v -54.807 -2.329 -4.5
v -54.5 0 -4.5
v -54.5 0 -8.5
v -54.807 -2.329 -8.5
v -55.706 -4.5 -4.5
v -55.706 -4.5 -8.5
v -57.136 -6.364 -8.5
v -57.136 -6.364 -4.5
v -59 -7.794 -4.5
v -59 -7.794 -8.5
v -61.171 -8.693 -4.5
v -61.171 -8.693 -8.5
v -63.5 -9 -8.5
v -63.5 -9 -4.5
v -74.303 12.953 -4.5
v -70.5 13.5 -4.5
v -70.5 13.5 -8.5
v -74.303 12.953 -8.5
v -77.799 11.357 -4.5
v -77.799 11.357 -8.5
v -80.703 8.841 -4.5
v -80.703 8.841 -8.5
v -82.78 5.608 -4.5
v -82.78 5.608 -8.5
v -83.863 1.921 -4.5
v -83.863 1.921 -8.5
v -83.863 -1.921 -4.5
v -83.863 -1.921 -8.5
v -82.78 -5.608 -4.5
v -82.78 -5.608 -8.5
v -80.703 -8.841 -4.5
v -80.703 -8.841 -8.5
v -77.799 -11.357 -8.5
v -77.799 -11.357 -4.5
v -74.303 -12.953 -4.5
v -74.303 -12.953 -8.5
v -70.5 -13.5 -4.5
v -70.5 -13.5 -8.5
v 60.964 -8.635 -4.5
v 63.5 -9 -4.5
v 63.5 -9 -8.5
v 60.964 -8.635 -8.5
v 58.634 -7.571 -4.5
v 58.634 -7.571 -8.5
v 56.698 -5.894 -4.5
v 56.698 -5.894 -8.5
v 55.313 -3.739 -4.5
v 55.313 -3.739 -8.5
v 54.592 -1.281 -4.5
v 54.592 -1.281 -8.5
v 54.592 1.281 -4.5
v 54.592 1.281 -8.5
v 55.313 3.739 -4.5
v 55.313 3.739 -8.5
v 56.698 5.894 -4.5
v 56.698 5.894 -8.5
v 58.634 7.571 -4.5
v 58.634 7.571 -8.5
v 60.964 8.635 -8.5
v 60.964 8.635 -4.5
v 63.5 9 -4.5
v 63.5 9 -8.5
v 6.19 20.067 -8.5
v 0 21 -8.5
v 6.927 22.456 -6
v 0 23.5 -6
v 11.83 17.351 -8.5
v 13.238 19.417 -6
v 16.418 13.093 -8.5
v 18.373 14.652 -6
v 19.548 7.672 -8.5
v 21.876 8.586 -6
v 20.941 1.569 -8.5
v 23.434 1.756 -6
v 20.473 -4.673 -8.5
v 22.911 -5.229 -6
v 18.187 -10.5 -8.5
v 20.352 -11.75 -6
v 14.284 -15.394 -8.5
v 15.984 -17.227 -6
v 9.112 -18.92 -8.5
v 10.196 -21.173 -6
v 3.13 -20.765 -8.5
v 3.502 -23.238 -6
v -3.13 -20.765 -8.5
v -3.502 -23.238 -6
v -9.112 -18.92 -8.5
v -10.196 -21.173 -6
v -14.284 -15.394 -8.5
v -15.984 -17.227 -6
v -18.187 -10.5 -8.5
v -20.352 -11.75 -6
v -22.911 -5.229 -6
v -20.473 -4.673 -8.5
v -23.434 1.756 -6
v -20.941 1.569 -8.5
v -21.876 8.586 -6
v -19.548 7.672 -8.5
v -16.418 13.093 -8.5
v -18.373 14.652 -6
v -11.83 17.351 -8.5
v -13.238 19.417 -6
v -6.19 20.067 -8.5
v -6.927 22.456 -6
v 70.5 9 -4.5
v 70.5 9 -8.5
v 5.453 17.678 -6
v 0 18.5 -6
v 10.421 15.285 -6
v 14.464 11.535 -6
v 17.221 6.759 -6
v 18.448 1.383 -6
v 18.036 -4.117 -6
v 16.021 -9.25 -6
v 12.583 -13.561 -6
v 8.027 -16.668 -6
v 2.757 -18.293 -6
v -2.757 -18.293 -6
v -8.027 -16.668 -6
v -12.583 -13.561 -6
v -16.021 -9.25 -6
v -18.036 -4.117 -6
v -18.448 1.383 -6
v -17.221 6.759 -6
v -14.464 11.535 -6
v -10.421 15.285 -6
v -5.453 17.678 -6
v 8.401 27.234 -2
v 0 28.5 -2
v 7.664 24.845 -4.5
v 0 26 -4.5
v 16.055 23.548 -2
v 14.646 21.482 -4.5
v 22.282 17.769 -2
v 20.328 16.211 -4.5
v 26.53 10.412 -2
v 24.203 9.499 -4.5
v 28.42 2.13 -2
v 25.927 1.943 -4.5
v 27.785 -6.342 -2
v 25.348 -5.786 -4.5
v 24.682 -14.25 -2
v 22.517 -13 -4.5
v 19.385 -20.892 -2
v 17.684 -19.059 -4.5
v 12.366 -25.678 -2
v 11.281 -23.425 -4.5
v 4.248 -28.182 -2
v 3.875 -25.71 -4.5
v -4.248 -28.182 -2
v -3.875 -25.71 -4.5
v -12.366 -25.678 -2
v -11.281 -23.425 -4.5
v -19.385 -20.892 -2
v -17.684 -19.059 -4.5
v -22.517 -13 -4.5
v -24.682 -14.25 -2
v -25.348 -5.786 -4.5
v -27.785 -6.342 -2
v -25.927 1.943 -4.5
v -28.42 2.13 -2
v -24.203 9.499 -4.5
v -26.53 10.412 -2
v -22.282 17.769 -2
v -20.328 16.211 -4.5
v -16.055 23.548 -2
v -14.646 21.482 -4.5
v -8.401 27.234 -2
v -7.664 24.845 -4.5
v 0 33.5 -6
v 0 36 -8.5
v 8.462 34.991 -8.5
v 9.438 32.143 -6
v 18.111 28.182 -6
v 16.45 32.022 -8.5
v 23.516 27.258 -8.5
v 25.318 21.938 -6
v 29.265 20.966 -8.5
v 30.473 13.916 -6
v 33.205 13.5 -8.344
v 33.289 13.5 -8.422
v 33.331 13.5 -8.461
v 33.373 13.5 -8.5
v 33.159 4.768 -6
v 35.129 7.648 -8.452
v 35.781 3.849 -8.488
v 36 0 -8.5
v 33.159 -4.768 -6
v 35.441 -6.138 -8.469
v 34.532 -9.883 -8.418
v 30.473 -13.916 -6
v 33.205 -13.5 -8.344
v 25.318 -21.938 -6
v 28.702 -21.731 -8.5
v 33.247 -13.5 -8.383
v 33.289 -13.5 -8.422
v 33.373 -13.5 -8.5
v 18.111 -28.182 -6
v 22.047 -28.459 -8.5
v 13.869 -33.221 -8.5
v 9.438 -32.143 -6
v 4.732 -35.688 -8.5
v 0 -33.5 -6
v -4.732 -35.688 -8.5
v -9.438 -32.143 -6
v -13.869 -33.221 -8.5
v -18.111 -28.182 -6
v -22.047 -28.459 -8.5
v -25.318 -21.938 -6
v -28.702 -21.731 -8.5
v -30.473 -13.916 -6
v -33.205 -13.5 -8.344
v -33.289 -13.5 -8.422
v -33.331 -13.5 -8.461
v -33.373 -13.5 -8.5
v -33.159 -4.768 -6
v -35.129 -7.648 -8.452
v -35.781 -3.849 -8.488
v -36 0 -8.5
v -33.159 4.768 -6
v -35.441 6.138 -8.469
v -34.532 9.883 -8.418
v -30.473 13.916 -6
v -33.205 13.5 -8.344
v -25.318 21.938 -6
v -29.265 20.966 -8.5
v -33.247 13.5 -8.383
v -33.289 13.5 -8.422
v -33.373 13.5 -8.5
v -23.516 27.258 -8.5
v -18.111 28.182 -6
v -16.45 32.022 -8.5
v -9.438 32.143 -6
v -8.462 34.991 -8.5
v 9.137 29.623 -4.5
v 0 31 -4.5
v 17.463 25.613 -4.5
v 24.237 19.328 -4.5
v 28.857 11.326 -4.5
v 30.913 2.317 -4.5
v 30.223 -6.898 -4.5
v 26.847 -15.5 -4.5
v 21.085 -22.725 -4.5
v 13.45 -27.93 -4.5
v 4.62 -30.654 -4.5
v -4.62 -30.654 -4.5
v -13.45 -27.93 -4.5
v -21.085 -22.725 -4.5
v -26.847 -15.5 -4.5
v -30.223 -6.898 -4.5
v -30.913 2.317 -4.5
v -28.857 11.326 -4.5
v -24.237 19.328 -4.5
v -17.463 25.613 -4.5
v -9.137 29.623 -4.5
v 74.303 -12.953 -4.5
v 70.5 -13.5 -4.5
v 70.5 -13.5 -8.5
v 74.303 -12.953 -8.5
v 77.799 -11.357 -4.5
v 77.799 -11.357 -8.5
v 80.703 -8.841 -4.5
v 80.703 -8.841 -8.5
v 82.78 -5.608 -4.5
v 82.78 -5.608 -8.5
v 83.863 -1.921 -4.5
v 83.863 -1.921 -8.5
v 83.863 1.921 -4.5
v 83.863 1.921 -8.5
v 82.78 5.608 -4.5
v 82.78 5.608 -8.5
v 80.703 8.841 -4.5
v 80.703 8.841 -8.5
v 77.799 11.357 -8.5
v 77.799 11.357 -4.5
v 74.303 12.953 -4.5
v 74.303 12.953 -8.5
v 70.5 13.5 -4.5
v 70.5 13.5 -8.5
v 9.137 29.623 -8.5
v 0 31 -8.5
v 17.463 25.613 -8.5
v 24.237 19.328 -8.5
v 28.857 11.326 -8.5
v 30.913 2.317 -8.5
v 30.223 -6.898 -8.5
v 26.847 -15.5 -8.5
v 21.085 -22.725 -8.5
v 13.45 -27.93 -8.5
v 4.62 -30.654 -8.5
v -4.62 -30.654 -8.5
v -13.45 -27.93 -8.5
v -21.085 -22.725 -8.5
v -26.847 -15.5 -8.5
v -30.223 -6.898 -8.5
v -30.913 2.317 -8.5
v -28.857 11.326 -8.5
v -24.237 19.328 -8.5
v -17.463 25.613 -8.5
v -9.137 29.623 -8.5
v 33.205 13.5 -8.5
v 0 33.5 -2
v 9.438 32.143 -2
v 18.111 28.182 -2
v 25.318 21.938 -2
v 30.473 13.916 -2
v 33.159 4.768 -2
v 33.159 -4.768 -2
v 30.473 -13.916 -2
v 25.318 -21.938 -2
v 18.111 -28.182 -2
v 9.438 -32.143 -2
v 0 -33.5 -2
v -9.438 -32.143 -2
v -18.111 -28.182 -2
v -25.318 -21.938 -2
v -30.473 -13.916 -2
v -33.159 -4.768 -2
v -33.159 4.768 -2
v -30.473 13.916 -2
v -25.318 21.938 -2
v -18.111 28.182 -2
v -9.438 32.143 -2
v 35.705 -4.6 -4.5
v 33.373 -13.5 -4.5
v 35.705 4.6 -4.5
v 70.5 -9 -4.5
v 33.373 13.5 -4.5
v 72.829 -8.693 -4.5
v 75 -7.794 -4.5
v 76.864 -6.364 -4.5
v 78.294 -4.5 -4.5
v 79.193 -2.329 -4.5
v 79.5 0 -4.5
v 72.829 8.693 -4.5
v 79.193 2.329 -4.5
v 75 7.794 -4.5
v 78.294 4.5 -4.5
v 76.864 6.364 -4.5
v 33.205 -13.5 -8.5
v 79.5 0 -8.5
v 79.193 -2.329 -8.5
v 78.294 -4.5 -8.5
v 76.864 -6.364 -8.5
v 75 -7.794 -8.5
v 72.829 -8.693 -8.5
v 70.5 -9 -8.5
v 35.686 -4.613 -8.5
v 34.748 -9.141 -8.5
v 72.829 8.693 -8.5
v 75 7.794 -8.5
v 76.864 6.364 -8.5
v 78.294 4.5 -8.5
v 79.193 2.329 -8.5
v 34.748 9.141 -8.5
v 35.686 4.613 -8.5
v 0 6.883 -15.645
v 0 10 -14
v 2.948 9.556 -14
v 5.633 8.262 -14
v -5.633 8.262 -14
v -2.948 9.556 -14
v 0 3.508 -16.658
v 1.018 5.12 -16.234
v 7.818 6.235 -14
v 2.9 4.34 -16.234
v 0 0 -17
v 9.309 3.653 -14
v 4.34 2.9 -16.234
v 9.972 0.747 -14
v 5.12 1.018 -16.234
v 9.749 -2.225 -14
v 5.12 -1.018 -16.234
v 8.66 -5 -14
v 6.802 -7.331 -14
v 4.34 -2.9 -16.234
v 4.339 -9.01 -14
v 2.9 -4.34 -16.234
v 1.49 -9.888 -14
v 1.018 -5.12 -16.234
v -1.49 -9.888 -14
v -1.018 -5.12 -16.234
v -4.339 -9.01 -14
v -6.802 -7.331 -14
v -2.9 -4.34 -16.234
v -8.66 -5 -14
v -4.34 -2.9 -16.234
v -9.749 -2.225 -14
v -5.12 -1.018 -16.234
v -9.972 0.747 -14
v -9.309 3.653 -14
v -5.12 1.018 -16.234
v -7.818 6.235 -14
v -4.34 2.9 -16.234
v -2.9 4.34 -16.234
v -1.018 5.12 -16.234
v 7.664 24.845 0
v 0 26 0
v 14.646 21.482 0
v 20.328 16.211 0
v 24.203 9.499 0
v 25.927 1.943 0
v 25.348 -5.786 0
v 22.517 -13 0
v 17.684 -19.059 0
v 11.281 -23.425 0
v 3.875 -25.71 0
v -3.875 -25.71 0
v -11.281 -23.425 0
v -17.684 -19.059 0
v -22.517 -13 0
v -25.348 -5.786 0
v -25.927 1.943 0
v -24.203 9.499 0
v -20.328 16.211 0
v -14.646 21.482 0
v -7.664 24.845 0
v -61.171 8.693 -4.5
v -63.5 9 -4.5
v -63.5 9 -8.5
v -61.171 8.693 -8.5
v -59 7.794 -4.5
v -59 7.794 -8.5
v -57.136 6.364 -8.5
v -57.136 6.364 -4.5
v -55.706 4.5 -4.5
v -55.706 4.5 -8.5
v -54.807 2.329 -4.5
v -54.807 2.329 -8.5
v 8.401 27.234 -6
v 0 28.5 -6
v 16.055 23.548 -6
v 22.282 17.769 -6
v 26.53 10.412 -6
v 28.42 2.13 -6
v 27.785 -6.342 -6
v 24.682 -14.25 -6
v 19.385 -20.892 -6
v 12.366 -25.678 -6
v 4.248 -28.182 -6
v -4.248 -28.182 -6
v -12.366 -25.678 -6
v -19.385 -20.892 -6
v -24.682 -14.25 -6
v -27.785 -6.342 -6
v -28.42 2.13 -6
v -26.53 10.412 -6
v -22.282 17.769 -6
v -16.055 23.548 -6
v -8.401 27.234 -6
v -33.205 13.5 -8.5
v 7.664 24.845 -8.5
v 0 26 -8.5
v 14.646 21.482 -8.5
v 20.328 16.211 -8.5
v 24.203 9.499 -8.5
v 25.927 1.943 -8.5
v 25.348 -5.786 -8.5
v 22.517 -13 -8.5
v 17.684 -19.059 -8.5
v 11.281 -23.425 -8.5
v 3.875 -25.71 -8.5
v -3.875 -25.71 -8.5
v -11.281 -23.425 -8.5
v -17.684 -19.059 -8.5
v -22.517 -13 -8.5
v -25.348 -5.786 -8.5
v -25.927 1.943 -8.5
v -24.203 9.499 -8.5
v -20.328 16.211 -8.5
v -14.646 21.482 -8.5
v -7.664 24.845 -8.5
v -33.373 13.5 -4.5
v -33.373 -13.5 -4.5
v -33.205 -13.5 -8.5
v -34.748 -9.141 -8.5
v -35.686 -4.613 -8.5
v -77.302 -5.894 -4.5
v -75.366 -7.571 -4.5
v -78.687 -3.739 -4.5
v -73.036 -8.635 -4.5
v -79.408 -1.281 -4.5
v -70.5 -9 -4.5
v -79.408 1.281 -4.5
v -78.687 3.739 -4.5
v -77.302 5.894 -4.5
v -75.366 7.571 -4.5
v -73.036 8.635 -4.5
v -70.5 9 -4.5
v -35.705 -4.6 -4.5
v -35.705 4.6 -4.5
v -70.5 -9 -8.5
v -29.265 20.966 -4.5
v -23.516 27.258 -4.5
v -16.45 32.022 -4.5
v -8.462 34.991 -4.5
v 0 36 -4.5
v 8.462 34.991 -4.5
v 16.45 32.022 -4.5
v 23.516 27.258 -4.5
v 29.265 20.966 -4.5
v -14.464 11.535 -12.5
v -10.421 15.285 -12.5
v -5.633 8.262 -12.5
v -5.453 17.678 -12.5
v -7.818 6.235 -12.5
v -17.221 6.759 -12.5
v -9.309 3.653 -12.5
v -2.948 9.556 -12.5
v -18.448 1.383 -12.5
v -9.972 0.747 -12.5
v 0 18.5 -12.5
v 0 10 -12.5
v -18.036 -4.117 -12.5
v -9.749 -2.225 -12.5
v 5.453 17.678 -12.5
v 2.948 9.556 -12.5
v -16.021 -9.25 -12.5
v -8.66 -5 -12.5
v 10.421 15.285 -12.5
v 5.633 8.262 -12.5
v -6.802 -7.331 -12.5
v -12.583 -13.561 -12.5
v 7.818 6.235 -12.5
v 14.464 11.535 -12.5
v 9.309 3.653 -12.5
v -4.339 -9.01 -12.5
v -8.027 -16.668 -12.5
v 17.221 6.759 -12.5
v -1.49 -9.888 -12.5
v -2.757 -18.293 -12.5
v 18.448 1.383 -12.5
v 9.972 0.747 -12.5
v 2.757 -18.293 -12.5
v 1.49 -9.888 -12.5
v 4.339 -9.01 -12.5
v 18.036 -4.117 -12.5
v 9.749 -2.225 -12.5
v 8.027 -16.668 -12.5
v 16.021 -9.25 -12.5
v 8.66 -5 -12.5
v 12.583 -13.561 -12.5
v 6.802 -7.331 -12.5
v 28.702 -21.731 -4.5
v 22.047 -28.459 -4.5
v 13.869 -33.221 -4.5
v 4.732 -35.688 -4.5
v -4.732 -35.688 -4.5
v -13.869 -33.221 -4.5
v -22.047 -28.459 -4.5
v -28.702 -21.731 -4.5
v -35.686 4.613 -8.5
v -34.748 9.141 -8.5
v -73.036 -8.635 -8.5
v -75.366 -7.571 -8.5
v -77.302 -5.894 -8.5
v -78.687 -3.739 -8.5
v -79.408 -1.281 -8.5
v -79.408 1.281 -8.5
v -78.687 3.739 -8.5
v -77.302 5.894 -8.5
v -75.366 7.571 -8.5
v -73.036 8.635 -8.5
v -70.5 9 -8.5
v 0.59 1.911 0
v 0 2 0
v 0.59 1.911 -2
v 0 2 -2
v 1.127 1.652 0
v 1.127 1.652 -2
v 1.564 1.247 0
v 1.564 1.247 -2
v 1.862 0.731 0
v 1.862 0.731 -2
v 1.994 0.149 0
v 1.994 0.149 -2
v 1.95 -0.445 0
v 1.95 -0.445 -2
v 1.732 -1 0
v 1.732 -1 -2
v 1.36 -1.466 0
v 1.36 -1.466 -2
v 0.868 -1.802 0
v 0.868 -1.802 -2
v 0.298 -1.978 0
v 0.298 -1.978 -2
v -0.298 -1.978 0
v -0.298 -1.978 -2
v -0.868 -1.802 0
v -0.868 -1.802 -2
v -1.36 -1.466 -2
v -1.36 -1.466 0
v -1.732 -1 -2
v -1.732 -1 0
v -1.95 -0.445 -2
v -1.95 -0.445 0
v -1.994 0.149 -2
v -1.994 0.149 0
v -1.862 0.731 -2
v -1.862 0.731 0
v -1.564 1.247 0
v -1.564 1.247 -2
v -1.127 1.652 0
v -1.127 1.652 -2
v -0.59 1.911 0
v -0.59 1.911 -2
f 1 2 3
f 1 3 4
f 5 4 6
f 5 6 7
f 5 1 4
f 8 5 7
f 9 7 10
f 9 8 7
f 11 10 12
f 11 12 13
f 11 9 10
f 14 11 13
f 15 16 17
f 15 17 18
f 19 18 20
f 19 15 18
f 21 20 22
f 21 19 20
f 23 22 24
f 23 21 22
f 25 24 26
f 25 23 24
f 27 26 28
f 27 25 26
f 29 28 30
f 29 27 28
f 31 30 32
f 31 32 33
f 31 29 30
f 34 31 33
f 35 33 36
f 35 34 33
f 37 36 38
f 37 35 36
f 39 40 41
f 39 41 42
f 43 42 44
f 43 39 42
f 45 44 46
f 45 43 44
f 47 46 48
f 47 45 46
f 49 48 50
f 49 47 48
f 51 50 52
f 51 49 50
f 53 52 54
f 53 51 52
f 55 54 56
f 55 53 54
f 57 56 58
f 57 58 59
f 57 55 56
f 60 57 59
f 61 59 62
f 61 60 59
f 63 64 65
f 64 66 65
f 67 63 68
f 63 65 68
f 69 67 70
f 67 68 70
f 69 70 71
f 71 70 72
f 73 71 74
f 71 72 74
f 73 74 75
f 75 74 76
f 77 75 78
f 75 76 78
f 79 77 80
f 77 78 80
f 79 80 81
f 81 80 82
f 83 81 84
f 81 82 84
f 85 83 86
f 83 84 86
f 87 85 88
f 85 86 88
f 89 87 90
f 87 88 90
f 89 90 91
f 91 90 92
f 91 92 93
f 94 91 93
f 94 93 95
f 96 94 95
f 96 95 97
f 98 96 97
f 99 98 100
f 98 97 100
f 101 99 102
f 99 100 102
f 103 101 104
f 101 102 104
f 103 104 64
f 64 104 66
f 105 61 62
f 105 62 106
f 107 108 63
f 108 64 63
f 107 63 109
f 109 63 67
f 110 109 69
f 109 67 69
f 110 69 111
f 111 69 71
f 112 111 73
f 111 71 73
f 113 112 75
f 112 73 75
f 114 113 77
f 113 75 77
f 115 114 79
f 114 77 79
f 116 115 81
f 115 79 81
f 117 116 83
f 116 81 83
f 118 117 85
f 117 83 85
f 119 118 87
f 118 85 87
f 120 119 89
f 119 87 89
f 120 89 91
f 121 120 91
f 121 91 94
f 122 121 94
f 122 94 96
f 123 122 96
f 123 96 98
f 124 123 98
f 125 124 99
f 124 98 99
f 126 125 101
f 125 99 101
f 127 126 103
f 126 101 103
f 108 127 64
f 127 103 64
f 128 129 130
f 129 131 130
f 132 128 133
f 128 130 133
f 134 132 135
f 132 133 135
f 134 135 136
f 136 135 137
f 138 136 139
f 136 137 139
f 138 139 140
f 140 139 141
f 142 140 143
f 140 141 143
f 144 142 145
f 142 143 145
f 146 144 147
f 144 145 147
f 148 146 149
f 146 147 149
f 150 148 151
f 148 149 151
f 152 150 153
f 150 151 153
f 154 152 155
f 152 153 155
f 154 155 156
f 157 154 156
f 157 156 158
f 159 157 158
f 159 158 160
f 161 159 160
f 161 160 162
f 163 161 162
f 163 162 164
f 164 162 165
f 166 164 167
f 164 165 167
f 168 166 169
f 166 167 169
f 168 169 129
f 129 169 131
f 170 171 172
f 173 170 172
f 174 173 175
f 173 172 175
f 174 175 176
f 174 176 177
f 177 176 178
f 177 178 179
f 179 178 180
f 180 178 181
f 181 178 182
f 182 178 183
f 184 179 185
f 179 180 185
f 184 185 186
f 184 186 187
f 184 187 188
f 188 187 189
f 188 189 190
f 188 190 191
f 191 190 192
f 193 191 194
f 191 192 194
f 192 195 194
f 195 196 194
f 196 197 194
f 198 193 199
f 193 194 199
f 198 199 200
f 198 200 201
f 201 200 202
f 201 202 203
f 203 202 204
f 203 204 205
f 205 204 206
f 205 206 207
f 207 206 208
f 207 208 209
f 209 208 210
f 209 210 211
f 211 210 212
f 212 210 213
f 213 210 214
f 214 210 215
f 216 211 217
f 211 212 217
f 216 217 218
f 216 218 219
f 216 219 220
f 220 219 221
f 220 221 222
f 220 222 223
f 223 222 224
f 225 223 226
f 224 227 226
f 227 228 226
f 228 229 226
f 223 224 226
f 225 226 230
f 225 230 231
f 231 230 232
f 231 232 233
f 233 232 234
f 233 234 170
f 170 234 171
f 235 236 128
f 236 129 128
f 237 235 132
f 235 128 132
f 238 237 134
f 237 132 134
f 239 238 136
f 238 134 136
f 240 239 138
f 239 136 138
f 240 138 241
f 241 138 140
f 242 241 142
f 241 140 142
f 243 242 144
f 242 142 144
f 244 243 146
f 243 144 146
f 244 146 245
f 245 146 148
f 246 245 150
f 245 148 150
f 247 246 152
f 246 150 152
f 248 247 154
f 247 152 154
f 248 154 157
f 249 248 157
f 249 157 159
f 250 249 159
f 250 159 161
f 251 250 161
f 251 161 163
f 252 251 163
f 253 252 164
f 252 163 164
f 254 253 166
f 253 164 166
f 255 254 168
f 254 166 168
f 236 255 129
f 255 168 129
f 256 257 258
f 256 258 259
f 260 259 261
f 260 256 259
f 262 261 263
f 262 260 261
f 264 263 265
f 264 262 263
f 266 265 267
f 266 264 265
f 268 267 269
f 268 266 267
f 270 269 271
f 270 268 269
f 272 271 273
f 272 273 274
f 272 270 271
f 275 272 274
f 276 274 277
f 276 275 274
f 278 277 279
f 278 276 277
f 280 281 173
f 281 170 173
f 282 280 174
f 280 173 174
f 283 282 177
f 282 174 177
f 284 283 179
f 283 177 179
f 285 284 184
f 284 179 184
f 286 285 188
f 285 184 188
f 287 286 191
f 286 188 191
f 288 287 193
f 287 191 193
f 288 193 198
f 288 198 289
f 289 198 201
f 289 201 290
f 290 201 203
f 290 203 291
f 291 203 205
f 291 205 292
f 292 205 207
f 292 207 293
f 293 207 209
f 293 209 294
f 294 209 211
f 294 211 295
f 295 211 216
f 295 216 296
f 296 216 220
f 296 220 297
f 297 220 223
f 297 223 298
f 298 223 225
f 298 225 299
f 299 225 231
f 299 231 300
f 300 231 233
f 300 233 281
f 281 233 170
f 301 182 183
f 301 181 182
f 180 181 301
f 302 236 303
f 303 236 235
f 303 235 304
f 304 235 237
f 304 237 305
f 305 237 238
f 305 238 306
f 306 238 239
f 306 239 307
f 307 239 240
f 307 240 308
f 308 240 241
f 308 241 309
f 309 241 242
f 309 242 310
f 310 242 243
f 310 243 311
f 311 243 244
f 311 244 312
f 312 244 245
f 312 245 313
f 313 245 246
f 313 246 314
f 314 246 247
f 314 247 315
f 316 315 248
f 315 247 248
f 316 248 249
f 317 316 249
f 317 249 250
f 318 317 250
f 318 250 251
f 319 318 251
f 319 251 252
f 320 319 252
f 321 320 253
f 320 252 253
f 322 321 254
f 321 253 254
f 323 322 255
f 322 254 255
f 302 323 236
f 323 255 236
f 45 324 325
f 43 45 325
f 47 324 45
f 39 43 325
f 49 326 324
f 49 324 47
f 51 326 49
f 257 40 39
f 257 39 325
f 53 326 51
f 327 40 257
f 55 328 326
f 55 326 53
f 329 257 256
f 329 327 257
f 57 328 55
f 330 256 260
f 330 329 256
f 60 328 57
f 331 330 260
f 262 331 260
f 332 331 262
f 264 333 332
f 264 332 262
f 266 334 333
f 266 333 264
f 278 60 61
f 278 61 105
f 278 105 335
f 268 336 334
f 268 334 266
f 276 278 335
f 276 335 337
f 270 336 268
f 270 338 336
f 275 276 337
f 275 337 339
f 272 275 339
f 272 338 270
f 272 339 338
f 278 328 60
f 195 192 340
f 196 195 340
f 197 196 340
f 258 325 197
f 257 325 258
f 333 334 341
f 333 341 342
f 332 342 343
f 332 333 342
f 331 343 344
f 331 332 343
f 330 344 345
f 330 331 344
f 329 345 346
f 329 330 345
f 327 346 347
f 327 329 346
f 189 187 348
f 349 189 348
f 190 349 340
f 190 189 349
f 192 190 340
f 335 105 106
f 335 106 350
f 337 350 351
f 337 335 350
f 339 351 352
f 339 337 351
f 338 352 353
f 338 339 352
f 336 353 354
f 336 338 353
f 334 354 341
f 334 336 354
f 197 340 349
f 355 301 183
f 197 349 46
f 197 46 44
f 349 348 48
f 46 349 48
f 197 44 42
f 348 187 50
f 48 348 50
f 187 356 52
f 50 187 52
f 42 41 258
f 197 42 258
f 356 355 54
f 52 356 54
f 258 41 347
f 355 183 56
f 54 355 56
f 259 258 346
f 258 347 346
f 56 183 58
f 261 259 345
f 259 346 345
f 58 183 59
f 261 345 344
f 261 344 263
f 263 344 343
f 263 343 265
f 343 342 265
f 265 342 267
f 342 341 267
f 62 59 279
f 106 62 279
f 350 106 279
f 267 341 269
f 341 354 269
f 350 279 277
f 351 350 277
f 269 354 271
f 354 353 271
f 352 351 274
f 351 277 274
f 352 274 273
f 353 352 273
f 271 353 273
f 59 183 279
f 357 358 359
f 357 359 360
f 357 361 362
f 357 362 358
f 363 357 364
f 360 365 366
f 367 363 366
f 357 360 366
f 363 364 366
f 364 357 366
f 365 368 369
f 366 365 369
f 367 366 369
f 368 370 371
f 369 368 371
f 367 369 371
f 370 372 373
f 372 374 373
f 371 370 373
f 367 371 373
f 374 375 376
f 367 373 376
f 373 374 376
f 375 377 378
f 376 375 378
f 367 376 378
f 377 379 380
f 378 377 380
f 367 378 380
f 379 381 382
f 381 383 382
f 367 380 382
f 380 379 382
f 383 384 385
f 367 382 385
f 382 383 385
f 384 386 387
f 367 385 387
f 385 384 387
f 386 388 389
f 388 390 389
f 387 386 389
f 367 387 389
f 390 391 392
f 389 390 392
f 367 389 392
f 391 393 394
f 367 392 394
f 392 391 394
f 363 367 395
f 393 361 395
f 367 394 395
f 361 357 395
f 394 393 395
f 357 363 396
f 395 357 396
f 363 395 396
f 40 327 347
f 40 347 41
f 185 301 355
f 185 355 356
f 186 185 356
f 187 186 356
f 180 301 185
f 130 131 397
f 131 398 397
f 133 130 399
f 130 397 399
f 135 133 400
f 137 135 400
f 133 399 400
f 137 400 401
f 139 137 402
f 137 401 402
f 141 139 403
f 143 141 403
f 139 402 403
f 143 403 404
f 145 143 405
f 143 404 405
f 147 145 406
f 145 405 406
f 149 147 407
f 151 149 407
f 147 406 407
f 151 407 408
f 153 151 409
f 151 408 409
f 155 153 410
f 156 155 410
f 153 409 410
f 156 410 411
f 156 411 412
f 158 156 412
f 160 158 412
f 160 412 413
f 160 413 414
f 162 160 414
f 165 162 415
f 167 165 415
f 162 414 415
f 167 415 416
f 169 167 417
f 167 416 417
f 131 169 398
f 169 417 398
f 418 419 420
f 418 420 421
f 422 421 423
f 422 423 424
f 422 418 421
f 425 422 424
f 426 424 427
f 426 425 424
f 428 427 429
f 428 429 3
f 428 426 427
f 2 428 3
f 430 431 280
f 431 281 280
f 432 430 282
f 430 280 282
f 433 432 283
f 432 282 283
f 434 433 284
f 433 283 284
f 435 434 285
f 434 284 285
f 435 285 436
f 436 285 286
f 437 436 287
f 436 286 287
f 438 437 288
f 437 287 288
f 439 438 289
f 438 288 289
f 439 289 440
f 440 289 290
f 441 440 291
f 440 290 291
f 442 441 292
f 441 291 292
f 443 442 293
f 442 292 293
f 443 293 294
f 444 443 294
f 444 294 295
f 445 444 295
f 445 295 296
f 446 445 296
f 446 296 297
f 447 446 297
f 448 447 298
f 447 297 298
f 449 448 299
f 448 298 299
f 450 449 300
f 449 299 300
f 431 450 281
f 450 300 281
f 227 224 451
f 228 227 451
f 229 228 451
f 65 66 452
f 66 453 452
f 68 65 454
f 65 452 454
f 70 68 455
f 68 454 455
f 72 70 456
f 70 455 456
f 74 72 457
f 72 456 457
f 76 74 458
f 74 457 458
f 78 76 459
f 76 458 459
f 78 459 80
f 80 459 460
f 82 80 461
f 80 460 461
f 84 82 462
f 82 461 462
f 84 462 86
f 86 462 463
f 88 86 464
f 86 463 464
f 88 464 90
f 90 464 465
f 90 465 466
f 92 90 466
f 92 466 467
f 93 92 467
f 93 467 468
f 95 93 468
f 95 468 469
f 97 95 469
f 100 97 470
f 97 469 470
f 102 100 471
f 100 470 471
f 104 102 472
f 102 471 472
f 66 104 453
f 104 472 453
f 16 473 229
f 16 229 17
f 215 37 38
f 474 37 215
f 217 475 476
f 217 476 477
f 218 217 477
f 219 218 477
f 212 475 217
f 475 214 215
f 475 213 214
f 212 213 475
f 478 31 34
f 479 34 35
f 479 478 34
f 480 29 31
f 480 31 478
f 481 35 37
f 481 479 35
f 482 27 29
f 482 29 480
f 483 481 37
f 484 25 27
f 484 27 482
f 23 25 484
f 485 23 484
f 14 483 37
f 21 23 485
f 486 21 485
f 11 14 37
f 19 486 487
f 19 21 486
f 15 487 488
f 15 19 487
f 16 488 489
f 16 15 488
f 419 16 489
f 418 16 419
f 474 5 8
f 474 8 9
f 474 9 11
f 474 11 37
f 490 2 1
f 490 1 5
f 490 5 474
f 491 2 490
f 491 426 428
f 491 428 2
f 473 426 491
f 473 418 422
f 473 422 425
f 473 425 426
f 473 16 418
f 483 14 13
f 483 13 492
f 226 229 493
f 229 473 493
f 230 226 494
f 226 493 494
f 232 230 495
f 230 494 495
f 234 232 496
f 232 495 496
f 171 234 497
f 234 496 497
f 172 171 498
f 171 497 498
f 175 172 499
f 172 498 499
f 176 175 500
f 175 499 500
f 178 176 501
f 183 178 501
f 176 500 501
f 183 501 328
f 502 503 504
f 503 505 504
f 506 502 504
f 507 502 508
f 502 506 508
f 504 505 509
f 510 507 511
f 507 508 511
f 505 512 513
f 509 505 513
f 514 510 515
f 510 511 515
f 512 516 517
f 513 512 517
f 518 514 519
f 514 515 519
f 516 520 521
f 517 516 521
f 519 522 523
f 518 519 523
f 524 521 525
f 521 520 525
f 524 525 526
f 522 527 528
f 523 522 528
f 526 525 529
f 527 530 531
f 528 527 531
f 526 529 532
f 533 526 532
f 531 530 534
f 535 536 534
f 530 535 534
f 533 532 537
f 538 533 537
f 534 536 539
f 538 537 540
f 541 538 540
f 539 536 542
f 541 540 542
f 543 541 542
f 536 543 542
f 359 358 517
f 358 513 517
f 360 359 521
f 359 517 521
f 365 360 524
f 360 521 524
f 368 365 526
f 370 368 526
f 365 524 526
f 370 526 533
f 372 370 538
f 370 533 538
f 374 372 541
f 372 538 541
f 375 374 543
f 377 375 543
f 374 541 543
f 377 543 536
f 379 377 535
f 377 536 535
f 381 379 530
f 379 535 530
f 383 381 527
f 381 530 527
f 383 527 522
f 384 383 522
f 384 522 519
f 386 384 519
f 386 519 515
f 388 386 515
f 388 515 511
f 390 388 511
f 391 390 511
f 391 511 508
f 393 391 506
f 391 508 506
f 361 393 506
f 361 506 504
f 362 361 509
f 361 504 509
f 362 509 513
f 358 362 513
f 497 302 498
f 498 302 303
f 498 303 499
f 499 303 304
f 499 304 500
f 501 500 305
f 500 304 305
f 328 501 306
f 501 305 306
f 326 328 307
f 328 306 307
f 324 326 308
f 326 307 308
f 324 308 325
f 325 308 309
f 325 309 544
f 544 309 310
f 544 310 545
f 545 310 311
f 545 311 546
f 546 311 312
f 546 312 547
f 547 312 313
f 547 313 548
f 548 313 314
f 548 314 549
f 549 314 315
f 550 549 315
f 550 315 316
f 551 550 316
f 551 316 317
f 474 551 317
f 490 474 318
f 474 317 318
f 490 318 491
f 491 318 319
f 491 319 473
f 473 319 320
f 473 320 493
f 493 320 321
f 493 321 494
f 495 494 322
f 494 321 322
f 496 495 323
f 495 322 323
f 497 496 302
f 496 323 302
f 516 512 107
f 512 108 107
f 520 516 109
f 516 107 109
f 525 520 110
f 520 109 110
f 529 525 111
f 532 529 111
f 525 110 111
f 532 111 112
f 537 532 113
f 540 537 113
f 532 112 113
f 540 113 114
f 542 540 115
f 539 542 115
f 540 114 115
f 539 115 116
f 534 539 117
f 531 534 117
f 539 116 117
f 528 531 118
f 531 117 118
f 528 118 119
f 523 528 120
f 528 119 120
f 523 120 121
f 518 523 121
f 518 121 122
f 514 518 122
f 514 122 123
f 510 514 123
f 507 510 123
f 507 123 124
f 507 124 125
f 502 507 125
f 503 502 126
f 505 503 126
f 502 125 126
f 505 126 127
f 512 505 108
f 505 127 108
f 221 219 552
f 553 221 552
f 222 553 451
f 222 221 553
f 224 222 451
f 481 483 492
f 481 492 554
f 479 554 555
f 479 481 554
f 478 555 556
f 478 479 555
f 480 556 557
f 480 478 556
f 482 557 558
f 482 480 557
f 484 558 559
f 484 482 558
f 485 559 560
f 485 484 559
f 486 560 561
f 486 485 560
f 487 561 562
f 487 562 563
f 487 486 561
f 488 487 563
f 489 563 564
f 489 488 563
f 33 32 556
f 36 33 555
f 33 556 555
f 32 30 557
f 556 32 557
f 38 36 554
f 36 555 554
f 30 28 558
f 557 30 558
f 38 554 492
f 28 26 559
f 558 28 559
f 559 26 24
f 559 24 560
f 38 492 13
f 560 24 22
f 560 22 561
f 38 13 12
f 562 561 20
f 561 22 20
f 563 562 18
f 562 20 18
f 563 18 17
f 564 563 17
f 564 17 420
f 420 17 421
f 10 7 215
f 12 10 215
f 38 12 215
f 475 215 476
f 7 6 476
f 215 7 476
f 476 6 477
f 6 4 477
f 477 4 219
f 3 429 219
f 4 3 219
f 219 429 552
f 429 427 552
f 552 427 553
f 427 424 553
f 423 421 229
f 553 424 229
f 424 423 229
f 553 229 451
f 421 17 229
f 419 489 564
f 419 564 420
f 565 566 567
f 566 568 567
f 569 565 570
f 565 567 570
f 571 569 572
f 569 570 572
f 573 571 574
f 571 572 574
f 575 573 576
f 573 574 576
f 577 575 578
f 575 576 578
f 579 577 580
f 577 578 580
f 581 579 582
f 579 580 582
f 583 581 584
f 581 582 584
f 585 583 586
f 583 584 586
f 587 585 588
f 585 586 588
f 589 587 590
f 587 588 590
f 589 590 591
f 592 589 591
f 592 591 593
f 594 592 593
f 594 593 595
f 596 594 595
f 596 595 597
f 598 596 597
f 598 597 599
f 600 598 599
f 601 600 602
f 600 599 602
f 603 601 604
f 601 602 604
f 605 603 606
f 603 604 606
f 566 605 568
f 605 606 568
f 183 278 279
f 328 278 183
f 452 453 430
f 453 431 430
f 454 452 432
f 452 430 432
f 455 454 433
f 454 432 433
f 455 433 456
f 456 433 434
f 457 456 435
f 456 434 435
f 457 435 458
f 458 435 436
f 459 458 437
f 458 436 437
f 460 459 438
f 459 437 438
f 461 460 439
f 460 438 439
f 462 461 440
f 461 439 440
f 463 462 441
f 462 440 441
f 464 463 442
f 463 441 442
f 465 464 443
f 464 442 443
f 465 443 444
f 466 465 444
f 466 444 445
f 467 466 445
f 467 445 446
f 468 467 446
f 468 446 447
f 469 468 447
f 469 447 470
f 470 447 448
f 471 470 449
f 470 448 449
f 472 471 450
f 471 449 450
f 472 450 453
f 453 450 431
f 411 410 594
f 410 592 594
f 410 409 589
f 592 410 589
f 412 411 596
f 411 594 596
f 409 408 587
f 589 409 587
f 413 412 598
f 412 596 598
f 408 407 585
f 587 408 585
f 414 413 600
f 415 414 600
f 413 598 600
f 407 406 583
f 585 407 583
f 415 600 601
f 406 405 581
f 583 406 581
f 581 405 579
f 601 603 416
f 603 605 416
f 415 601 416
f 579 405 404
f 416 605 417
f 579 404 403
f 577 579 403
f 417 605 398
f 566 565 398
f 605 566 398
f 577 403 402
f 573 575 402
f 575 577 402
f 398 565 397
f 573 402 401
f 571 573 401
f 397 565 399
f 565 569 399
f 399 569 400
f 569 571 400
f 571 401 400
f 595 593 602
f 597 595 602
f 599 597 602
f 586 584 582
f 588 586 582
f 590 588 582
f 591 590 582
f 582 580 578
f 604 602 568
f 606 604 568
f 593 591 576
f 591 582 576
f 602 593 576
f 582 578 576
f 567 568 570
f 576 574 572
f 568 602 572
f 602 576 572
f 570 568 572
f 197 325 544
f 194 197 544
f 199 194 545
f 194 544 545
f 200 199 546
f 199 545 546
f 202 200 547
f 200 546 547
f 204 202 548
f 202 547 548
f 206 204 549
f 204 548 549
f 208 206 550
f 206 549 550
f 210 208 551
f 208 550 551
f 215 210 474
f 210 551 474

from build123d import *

# Parameters (mm, degrees)
F3_START = -4.5
F3_DEPTH = 4


with BuildPart() as f1:
    # F0 (on Right) → F1 (revolve)
    with BuildSketch(Plane.YZ):
        Polygon((26, 0), (2, 0), (2, -2), (0, -2), (0, -14), (10, -14), (10, -12.5), (18.5, -12.5), (18.5, -6), (21, -8.5), (23.5, -6), (26, -8.5), (28.5, -6), (31, -8.5), (33.5, -6), (36, -8.5), (36, -4.5), (33.5, -2), (31, -4.5), (28.5, -2), (26, -4.5), align=None)
        with BuildLine():
            Line((10, -14), (0, -14))
            Line((0, -14), (0, -17))
            ThreePointArc((0, -17), (5.2201532545, -16.2338441815), (10, -14))
        make_face()
    revolve(axis=Axis((0, 0, -6.3047250733), (0, 0, -1)))

    # F2 (on face) → F3 (join)
    with BuildSketch(Plane.XY.offset(F3_START)):
        with BuildLine():
            ThreePointArc((-33.2049675533, -13.5), (-36, 0), (-33.2049675533, 13.5))
            Line((-33.2049675533, 13.5), (-70.5000009461, 13.5))
            ThreePointArc((-70.5000009461, 13.5), (-84, 0), (-70.5000009461, -13.5))
            Line((-70.5000009461, -13.5), (-33.2049675533, -13.5))
        make_face()
        with BuildLine():
            ThreePointArc((-70.5, -9), (-79.5, 0), (-70.5, 9))
            Line((-70.5, 9), (-63.5, 9))
            ThreePointArc((-63.5, 9), (-57.1360389693, 6.3639610307), (-54.5, 0))
            ThreePointArc((-54.5, 0), (-57.1360389693, -6.3639610307), (-63.5, -9))
            Line((-63.5, -9), (-70.5, -9))
        make_face(mode=Mode.SUBTRACT)
        with BuildLine():
            Line((33.2049675533, -13.5), (70.5000009461, -13.5))
            ThreePointArc((70.5000009461, -13.5), (84, 0), (70.5000009461, 13.5))
            Line((70.5000009461, 13.5), (33.2049675533, 13.5))
            ThreePointArc((33.2049675533, 13.5), (36, 0), (33.2049675533, -13.5))
        make_face()
        with BuildLine():
            Line((63.5, 9), (70.5, 9))
            ThreePointArc((70.5, 9), (76.8639610307, 6.3639610307), (79.5, 0))
            ThreePointArc((79.5, 0), (76.8639610307, -6.3639610307), (70.5, -9))
            Line((70.5, -9), (63.5, -9))
            ThreePointArc((63.5, -9), (54.5, 0), (63.5, 9))
        make_face(mode=Mode.SUBTRACT)
    extrude(amount=-F3_DEPTH)


solid = f1.part
